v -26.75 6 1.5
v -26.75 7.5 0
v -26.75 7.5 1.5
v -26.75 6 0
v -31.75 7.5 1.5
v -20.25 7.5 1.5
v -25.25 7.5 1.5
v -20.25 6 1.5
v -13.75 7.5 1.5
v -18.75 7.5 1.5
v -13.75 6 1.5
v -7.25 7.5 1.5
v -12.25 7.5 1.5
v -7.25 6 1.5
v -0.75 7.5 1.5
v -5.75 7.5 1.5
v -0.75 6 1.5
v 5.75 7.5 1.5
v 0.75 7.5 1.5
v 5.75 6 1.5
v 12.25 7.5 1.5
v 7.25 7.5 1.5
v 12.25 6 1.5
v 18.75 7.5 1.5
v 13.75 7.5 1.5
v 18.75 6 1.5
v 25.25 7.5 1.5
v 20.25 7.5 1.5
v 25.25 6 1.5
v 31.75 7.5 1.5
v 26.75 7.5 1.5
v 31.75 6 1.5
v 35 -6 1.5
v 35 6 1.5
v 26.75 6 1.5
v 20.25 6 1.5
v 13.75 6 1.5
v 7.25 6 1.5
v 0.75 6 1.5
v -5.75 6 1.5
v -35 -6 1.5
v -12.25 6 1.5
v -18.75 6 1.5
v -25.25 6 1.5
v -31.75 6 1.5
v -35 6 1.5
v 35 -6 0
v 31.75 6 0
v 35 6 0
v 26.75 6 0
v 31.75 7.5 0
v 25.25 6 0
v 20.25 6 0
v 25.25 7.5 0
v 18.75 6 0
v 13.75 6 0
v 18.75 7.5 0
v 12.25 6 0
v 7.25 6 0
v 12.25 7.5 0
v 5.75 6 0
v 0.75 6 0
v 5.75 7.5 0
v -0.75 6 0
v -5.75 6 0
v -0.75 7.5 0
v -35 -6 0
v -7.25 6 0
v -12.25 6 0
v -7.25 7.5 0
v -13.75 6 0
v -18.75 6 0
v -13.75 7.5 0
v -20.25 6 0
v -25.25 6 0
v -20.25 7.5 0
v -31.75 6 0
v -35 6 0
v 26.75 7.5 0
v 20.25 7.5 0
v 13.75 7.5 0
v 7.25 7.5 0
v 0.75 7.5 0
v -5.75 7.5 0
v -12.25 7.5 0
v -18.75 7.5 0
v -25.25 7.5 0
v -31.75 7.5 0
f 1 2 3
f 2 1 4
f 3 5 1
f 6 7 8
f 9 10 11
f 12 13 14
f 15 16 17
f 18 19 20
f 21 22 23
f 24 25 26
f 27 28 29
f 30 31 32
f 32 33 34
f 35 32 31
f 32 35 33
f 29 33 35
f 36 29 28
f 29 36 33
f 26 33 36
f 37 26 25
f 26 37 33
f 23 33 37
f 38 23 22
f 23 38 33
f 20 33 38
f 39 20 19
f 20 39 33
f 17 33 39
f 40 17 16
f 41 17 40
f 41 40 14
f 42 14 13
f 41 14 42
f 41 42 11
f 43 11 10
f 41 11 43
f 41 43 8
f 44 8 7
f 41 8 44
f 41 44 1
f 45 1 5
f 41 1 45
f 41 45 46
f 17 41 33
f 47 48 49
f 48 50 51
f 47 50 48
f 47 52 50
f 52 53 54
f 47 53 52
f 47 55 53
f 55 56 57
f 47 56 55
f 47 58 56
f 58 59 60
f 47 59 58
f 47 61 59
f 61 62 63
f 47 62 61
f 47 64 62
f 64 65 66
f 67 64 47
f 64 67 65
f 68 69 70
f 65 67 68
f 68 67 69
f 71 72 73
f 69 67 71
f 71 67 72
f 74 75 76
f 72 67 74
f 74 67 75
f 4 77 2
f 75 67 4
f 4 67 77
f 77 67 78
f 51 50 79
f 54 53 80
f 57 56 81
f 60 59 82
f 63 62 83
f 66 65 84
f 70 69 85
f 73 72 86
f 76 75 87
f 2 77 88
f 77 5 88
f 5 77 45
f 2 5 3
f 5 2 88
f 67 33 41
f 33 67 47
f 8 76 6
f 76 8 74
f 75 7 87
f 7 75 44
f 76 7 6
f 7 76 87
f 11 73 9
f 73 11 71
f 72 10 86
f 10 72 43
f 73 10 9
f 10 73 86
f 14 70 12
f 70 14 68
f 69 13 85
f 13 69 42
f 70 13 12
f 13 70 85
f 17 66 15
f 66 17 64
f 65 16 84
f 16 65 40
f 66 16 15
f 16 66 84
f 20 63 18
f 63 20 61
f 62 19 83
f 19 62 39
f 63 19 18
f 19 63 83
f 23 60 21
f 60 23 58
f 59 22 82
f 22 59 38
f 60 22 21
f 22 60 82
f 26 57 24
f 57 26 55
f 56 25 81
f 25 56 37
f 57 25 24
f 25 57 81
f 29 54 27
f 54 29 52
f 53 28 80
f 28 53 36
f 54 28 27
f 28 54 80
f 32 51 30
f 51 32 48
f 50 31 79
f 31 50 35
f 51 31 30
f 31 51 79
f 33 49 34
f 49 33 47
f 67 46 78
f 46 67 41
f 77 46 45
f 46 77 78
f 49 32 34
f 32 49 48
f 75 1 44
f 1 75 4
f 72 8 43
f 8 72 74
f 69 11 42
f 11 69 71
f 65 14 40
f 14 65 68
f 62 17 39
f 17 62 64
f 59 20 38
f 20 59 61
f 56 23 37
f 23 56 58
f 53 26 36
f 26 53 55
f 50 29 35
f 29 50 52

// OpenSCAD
// 10-well comb for casting agarose gels
// Print orientation: flat on bed, teeth pointing down (-Z)

// ---- Dimensions (mm) ----
plate_t      = 1.5;   // plate thickness (Z)
spine_len    = 70;    // spine length (X)
spine_w      = 12;    // spine width (Y)
tooth_w      = 5.0;   // tooth width (X)
tooth_len    = 12;    // tooth length (Y)
tooth_count  = 10;    // number of teeth
gap          = 1.5;   // gap between teeth (X)

$fn = 64;

// ---- Derived ----
pitch   = tooth_w + gap;          // centre-to-centre spacing
x_start = -(tooth_count - 1) * pitch / 2;  // first tooth centre (row centred)

// ---- Model ----
union() {
    // Spine (back bar)
    translate([-spine_len / 2, -spine_w / 2, 0])
        cube([spine_len, spine_w, plate_t]);

    // Teeth
    for (i = [0 : tooth_count - 1])
        translate([x_start + i * pitch - tooth_w / 2,
                   spine_w / 2 - tooth_len,
                   0])
            cube([tooth_w, tooth_len + plate_t, plate_t]);
}
